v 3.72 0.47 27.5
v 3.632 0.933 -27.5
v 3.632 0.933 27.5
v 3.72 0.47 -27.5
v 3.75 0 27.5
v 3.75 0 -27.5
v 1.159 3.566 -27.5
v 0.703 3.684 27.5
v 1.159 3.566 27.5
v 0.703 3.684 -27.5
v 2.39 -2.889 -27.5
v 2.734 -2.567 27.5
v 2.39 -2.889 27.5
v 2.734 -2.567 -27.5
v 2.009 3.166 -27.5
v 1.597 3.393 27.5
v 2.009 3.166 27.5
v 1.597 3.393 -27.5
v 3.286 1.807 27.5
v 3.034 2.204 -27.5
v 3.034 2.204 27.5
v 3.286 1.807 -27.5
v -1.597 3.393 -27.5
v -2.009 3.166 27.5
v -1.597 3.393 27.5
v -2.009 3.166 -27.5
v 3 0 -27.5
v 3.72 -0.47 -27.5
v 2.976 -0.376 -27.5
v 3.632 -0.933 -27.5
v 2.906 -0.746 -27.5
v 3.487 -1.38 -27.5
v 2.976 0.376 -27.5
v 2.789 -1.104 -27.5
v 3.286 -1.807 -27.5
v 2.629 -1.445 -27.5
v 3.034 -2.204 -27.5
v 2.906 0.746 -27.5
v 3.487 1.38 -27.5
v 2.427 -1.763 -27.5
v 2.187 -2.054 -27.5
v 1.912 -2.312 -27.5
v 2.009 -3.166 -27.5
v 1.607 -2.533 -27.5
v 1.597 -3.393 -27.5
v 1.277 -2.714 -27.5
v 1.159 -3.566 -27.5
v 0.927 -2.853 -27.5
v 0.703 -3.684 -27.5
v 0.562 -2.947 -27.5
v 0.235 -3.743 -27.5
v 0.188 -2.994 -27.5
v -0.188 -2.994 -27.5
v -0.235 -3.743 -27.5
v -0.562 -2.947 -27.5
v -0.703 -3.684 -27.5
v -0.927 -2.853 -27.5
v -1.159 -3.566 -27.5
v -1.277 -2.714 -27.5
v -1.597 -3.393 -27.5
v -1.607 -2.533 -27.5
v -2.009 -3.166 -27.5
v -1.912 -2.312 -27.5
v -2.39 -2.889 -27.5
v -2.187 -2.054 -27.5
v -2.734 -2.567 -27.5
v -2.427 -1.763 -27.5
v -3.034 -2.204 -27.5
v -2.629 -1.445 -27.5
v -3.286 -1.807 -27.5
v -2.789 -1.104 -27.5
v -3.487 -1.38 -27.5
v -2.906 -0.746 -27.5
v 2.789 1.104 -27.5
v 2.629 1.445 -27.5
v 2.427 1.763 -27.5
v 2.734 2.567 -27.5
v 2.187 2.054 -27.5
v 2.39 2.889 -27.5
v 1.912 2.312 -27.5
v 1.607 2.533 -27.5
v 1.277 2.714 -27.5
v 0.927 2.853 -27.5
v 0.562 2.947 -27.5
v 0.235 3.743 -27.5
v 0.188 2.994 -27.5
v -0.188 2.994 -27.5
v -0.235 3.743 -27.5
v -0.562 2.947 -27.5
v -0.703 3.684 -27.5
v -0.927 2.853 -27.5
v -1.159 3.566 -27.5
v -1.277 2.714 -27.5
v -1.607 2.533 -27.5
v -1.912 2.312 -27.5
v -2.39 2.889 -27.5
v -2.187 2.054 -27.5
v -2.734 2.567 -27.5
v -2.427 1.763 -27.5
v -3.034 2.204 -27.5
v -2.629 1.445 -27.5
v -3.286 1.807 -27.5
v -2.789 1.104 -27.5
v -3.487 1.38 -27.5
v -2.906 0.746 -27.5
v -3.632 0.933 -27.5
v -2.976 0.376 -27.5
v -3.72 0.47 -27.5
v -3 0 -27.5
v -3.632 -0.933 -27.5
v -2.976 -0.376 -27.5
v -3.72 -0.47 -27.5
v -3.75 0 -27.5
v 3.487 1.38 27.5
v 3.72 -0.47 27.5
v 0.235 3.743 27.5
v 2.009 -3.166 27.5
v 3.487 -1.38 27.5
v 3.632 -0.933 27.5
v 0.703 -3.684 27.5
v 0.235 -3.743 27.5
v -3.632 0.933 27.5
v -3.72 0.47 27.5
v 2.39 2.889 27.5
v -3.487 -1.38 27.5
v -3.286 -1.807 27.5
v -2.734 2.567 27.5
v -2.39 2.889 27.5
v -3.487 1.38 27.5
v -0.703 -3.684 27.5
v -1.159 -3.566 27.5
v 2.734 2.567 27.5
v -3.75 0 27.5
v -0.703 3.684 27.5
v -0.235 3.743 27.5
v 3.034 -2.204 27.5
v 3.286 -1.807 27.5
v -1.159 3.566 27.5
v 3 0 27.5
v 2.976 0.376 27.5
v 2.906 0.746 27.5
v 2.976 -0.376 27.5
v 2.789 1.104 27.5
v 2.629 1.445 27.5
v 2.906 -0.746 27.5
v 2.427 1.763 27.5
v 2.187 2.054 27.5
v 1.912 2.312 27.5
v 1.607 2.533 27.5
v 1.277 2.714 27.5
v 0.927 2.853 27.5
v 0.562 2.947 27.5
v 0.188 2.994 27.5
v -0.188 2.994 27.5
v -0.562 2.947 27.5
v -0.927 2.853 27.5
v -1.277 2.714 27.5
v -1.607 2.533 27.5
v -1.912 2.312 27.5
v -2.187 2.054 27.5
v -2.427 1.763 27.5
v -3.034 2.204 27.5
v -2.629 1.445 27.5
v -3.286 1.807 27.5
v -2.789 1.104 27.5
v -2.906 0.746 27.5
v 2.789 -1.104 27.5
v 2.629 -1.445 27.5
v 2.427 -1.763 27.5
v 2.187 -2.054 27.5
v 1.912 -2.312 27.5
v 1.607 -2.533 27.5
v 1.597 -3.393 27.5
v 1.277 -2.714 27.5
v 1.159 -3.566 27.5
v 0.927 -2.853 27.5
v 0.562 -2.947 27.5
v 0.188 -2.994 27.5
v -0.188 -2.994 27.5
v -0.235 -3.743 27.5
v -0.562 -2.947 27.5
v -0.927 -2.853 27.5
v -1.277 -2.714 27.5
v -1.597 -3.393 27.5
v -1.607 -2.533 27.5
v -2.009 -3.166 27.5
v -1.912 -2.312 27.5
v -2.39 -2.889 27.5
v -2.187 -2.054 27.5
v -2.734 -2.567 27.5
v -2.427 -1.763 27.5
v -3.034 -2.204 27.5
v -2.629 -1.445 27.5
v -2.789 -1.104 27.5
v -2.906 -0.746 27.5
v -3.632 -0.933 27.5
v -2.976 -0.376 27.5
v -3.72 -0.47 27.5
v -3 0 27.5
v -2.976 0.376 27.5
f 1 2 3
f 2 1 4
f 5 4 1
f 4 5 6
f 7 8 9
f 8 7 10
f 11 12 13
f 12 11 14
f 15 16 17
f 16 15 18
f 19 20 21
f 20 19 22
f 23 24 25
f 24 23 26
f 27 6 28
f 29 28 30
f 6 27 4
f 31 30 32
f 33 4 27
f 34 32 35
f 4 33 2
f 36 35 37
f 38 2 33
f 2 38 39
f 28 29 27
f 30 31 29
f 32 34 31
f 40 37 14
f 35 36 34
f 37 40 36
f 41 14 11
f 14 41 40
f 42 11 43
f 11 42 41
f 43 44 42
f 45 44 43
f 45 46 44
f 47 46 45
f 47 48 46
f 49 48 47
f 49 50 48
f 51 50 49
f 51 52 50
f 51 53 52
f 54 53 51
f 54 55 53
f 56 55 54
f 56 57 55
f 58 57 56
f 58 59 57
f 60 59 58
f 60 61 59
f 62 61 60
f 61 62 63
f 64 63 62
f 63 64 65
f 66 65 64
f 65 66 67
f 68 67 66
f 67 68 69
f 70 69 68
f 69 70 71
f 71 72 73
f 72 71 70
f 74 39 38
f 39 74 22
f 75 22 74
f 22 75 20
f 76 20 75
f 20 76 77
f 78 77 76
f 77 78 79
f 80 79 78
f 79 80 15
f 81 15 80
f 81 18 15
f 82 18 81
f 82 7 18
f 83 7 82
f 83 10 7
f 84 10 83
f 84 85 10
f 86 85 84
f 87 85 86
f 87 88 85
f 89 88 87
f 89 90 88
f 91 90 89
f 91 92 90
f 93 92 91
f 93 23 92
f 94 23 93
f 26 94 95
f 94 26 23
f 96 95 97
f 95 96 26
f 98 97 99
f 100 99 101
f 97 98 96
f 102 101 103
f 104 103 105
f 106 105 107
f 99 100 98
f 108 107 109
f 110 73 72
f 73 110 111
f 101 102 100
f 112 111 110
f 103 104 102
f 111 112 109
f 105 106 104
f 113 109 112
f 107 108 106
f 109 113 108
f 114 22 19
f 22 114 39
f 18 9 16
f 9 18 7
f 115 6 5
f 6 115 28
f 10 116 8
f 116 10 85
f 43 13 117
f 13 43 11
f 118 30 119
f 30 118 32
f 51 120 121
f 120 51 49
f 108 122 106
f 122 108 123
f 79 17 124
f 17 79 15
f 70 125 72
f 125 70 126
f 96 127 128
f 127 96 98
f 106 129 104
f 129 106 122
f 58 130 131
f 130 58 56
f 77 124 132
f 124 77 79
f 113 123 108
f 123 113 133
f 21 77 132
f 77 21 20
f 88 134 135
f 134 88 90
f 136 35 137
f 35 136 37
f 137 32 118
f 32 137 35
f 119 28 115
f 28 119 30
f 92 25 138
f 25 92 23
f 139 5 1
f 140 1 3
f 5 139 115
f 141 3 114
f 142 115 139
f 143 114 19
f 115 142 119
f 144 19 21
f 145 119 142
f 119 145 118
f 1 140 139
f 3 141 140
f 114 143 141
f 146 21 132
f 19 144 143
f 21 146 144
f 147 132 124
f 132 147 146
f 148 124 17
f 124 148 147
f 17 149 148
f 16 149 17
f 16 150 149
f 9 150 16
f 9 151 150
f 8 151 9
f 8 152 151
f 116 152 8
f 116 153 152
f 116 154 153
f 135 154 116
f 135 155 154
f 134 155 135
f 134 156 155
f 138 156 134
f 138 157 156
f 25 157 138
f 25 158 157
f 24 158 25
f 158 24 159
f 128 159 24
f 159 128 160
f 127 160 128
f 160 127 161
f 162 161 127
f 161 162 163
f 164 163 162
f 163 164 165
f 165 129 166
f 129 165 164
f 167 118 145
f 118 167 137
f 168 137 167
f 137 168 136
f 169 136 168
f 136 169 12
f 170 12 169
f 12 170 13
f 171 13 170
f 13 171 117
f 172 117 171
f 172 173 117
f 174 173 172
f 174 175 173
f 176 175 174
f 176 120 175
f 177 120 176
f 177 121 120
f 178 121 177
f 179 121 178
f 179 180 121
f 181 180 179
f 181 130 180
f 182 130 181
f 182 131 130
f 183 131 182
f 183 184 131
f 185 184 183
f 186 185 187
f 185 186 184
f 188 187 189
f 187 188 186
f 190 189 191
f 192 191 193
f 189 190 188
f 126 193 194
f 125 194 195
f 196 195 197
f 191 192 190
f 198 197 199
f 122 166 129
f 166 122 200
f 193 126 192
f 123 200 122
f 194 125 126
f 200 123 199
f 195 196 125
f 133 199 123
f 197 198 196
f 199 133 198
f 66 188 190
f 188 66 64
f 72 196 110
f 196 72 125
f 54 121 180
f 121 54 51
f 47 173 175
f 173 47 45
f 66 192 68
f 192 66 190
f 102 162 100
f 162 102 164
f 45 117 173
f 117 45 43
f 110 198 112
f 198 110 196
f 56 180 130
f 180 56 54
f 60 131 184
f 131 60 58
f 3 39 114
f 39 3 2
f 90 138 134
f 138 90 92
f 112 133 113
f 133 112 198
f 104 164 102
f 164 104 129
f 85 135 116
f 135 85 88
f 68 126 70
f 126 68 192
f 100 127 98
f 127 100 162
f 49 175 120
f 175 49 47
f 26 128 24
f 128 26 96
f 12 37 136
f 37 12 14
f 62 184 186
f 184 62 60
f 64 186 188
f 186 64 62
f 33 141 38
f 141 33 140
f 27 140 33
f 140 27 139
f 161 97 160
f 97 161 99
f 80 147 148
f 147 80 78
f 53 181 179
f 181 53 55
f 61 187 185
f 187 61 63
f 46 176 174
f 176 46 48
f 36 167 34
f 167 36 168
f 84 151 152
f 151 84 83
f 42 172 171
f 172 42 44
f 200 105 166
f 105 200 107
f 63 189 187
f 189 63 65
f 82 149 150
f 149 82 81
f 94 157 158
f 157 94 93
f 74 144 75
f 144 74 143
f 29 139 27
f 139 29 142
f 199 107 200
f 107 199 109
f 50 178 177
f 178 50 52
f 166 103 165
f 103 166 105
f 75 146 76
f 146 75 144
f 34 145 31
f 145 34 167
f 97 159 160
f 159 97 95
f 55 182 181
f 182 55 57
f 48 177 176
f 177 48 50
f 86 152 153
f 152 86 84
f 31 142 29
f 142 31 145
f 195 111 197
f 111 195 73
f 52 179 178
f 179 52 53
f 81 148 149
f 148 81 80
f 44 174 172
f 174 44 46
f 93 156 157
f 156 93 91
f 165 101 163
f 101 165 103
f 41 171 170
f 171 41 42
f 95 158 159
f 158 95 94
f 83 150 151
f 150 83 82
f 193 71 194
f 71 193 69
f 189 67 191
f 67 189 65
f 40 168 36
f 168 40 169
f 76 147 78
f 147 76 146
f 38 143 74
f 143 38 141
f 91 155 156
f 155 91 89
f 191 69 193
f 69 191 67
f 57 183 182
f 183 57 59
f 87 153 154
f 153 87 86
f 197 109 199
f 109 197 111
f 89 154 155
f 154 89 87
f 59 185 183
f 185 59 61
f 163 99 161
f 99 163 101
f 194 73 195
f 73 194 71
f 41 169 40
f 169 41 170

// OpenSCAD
$fn = 50;


difference() {
	union() {
		translate(v = [0, 0, -27.5000000000]) {
			cylinder(h = 55, r = 3.7500000000);
		}
	}
	union() {
		translate(v = [0, 0, -100.0000000000]) {
			cylinder(h = 200, r = 3.0000000000);
		}
	}
}
